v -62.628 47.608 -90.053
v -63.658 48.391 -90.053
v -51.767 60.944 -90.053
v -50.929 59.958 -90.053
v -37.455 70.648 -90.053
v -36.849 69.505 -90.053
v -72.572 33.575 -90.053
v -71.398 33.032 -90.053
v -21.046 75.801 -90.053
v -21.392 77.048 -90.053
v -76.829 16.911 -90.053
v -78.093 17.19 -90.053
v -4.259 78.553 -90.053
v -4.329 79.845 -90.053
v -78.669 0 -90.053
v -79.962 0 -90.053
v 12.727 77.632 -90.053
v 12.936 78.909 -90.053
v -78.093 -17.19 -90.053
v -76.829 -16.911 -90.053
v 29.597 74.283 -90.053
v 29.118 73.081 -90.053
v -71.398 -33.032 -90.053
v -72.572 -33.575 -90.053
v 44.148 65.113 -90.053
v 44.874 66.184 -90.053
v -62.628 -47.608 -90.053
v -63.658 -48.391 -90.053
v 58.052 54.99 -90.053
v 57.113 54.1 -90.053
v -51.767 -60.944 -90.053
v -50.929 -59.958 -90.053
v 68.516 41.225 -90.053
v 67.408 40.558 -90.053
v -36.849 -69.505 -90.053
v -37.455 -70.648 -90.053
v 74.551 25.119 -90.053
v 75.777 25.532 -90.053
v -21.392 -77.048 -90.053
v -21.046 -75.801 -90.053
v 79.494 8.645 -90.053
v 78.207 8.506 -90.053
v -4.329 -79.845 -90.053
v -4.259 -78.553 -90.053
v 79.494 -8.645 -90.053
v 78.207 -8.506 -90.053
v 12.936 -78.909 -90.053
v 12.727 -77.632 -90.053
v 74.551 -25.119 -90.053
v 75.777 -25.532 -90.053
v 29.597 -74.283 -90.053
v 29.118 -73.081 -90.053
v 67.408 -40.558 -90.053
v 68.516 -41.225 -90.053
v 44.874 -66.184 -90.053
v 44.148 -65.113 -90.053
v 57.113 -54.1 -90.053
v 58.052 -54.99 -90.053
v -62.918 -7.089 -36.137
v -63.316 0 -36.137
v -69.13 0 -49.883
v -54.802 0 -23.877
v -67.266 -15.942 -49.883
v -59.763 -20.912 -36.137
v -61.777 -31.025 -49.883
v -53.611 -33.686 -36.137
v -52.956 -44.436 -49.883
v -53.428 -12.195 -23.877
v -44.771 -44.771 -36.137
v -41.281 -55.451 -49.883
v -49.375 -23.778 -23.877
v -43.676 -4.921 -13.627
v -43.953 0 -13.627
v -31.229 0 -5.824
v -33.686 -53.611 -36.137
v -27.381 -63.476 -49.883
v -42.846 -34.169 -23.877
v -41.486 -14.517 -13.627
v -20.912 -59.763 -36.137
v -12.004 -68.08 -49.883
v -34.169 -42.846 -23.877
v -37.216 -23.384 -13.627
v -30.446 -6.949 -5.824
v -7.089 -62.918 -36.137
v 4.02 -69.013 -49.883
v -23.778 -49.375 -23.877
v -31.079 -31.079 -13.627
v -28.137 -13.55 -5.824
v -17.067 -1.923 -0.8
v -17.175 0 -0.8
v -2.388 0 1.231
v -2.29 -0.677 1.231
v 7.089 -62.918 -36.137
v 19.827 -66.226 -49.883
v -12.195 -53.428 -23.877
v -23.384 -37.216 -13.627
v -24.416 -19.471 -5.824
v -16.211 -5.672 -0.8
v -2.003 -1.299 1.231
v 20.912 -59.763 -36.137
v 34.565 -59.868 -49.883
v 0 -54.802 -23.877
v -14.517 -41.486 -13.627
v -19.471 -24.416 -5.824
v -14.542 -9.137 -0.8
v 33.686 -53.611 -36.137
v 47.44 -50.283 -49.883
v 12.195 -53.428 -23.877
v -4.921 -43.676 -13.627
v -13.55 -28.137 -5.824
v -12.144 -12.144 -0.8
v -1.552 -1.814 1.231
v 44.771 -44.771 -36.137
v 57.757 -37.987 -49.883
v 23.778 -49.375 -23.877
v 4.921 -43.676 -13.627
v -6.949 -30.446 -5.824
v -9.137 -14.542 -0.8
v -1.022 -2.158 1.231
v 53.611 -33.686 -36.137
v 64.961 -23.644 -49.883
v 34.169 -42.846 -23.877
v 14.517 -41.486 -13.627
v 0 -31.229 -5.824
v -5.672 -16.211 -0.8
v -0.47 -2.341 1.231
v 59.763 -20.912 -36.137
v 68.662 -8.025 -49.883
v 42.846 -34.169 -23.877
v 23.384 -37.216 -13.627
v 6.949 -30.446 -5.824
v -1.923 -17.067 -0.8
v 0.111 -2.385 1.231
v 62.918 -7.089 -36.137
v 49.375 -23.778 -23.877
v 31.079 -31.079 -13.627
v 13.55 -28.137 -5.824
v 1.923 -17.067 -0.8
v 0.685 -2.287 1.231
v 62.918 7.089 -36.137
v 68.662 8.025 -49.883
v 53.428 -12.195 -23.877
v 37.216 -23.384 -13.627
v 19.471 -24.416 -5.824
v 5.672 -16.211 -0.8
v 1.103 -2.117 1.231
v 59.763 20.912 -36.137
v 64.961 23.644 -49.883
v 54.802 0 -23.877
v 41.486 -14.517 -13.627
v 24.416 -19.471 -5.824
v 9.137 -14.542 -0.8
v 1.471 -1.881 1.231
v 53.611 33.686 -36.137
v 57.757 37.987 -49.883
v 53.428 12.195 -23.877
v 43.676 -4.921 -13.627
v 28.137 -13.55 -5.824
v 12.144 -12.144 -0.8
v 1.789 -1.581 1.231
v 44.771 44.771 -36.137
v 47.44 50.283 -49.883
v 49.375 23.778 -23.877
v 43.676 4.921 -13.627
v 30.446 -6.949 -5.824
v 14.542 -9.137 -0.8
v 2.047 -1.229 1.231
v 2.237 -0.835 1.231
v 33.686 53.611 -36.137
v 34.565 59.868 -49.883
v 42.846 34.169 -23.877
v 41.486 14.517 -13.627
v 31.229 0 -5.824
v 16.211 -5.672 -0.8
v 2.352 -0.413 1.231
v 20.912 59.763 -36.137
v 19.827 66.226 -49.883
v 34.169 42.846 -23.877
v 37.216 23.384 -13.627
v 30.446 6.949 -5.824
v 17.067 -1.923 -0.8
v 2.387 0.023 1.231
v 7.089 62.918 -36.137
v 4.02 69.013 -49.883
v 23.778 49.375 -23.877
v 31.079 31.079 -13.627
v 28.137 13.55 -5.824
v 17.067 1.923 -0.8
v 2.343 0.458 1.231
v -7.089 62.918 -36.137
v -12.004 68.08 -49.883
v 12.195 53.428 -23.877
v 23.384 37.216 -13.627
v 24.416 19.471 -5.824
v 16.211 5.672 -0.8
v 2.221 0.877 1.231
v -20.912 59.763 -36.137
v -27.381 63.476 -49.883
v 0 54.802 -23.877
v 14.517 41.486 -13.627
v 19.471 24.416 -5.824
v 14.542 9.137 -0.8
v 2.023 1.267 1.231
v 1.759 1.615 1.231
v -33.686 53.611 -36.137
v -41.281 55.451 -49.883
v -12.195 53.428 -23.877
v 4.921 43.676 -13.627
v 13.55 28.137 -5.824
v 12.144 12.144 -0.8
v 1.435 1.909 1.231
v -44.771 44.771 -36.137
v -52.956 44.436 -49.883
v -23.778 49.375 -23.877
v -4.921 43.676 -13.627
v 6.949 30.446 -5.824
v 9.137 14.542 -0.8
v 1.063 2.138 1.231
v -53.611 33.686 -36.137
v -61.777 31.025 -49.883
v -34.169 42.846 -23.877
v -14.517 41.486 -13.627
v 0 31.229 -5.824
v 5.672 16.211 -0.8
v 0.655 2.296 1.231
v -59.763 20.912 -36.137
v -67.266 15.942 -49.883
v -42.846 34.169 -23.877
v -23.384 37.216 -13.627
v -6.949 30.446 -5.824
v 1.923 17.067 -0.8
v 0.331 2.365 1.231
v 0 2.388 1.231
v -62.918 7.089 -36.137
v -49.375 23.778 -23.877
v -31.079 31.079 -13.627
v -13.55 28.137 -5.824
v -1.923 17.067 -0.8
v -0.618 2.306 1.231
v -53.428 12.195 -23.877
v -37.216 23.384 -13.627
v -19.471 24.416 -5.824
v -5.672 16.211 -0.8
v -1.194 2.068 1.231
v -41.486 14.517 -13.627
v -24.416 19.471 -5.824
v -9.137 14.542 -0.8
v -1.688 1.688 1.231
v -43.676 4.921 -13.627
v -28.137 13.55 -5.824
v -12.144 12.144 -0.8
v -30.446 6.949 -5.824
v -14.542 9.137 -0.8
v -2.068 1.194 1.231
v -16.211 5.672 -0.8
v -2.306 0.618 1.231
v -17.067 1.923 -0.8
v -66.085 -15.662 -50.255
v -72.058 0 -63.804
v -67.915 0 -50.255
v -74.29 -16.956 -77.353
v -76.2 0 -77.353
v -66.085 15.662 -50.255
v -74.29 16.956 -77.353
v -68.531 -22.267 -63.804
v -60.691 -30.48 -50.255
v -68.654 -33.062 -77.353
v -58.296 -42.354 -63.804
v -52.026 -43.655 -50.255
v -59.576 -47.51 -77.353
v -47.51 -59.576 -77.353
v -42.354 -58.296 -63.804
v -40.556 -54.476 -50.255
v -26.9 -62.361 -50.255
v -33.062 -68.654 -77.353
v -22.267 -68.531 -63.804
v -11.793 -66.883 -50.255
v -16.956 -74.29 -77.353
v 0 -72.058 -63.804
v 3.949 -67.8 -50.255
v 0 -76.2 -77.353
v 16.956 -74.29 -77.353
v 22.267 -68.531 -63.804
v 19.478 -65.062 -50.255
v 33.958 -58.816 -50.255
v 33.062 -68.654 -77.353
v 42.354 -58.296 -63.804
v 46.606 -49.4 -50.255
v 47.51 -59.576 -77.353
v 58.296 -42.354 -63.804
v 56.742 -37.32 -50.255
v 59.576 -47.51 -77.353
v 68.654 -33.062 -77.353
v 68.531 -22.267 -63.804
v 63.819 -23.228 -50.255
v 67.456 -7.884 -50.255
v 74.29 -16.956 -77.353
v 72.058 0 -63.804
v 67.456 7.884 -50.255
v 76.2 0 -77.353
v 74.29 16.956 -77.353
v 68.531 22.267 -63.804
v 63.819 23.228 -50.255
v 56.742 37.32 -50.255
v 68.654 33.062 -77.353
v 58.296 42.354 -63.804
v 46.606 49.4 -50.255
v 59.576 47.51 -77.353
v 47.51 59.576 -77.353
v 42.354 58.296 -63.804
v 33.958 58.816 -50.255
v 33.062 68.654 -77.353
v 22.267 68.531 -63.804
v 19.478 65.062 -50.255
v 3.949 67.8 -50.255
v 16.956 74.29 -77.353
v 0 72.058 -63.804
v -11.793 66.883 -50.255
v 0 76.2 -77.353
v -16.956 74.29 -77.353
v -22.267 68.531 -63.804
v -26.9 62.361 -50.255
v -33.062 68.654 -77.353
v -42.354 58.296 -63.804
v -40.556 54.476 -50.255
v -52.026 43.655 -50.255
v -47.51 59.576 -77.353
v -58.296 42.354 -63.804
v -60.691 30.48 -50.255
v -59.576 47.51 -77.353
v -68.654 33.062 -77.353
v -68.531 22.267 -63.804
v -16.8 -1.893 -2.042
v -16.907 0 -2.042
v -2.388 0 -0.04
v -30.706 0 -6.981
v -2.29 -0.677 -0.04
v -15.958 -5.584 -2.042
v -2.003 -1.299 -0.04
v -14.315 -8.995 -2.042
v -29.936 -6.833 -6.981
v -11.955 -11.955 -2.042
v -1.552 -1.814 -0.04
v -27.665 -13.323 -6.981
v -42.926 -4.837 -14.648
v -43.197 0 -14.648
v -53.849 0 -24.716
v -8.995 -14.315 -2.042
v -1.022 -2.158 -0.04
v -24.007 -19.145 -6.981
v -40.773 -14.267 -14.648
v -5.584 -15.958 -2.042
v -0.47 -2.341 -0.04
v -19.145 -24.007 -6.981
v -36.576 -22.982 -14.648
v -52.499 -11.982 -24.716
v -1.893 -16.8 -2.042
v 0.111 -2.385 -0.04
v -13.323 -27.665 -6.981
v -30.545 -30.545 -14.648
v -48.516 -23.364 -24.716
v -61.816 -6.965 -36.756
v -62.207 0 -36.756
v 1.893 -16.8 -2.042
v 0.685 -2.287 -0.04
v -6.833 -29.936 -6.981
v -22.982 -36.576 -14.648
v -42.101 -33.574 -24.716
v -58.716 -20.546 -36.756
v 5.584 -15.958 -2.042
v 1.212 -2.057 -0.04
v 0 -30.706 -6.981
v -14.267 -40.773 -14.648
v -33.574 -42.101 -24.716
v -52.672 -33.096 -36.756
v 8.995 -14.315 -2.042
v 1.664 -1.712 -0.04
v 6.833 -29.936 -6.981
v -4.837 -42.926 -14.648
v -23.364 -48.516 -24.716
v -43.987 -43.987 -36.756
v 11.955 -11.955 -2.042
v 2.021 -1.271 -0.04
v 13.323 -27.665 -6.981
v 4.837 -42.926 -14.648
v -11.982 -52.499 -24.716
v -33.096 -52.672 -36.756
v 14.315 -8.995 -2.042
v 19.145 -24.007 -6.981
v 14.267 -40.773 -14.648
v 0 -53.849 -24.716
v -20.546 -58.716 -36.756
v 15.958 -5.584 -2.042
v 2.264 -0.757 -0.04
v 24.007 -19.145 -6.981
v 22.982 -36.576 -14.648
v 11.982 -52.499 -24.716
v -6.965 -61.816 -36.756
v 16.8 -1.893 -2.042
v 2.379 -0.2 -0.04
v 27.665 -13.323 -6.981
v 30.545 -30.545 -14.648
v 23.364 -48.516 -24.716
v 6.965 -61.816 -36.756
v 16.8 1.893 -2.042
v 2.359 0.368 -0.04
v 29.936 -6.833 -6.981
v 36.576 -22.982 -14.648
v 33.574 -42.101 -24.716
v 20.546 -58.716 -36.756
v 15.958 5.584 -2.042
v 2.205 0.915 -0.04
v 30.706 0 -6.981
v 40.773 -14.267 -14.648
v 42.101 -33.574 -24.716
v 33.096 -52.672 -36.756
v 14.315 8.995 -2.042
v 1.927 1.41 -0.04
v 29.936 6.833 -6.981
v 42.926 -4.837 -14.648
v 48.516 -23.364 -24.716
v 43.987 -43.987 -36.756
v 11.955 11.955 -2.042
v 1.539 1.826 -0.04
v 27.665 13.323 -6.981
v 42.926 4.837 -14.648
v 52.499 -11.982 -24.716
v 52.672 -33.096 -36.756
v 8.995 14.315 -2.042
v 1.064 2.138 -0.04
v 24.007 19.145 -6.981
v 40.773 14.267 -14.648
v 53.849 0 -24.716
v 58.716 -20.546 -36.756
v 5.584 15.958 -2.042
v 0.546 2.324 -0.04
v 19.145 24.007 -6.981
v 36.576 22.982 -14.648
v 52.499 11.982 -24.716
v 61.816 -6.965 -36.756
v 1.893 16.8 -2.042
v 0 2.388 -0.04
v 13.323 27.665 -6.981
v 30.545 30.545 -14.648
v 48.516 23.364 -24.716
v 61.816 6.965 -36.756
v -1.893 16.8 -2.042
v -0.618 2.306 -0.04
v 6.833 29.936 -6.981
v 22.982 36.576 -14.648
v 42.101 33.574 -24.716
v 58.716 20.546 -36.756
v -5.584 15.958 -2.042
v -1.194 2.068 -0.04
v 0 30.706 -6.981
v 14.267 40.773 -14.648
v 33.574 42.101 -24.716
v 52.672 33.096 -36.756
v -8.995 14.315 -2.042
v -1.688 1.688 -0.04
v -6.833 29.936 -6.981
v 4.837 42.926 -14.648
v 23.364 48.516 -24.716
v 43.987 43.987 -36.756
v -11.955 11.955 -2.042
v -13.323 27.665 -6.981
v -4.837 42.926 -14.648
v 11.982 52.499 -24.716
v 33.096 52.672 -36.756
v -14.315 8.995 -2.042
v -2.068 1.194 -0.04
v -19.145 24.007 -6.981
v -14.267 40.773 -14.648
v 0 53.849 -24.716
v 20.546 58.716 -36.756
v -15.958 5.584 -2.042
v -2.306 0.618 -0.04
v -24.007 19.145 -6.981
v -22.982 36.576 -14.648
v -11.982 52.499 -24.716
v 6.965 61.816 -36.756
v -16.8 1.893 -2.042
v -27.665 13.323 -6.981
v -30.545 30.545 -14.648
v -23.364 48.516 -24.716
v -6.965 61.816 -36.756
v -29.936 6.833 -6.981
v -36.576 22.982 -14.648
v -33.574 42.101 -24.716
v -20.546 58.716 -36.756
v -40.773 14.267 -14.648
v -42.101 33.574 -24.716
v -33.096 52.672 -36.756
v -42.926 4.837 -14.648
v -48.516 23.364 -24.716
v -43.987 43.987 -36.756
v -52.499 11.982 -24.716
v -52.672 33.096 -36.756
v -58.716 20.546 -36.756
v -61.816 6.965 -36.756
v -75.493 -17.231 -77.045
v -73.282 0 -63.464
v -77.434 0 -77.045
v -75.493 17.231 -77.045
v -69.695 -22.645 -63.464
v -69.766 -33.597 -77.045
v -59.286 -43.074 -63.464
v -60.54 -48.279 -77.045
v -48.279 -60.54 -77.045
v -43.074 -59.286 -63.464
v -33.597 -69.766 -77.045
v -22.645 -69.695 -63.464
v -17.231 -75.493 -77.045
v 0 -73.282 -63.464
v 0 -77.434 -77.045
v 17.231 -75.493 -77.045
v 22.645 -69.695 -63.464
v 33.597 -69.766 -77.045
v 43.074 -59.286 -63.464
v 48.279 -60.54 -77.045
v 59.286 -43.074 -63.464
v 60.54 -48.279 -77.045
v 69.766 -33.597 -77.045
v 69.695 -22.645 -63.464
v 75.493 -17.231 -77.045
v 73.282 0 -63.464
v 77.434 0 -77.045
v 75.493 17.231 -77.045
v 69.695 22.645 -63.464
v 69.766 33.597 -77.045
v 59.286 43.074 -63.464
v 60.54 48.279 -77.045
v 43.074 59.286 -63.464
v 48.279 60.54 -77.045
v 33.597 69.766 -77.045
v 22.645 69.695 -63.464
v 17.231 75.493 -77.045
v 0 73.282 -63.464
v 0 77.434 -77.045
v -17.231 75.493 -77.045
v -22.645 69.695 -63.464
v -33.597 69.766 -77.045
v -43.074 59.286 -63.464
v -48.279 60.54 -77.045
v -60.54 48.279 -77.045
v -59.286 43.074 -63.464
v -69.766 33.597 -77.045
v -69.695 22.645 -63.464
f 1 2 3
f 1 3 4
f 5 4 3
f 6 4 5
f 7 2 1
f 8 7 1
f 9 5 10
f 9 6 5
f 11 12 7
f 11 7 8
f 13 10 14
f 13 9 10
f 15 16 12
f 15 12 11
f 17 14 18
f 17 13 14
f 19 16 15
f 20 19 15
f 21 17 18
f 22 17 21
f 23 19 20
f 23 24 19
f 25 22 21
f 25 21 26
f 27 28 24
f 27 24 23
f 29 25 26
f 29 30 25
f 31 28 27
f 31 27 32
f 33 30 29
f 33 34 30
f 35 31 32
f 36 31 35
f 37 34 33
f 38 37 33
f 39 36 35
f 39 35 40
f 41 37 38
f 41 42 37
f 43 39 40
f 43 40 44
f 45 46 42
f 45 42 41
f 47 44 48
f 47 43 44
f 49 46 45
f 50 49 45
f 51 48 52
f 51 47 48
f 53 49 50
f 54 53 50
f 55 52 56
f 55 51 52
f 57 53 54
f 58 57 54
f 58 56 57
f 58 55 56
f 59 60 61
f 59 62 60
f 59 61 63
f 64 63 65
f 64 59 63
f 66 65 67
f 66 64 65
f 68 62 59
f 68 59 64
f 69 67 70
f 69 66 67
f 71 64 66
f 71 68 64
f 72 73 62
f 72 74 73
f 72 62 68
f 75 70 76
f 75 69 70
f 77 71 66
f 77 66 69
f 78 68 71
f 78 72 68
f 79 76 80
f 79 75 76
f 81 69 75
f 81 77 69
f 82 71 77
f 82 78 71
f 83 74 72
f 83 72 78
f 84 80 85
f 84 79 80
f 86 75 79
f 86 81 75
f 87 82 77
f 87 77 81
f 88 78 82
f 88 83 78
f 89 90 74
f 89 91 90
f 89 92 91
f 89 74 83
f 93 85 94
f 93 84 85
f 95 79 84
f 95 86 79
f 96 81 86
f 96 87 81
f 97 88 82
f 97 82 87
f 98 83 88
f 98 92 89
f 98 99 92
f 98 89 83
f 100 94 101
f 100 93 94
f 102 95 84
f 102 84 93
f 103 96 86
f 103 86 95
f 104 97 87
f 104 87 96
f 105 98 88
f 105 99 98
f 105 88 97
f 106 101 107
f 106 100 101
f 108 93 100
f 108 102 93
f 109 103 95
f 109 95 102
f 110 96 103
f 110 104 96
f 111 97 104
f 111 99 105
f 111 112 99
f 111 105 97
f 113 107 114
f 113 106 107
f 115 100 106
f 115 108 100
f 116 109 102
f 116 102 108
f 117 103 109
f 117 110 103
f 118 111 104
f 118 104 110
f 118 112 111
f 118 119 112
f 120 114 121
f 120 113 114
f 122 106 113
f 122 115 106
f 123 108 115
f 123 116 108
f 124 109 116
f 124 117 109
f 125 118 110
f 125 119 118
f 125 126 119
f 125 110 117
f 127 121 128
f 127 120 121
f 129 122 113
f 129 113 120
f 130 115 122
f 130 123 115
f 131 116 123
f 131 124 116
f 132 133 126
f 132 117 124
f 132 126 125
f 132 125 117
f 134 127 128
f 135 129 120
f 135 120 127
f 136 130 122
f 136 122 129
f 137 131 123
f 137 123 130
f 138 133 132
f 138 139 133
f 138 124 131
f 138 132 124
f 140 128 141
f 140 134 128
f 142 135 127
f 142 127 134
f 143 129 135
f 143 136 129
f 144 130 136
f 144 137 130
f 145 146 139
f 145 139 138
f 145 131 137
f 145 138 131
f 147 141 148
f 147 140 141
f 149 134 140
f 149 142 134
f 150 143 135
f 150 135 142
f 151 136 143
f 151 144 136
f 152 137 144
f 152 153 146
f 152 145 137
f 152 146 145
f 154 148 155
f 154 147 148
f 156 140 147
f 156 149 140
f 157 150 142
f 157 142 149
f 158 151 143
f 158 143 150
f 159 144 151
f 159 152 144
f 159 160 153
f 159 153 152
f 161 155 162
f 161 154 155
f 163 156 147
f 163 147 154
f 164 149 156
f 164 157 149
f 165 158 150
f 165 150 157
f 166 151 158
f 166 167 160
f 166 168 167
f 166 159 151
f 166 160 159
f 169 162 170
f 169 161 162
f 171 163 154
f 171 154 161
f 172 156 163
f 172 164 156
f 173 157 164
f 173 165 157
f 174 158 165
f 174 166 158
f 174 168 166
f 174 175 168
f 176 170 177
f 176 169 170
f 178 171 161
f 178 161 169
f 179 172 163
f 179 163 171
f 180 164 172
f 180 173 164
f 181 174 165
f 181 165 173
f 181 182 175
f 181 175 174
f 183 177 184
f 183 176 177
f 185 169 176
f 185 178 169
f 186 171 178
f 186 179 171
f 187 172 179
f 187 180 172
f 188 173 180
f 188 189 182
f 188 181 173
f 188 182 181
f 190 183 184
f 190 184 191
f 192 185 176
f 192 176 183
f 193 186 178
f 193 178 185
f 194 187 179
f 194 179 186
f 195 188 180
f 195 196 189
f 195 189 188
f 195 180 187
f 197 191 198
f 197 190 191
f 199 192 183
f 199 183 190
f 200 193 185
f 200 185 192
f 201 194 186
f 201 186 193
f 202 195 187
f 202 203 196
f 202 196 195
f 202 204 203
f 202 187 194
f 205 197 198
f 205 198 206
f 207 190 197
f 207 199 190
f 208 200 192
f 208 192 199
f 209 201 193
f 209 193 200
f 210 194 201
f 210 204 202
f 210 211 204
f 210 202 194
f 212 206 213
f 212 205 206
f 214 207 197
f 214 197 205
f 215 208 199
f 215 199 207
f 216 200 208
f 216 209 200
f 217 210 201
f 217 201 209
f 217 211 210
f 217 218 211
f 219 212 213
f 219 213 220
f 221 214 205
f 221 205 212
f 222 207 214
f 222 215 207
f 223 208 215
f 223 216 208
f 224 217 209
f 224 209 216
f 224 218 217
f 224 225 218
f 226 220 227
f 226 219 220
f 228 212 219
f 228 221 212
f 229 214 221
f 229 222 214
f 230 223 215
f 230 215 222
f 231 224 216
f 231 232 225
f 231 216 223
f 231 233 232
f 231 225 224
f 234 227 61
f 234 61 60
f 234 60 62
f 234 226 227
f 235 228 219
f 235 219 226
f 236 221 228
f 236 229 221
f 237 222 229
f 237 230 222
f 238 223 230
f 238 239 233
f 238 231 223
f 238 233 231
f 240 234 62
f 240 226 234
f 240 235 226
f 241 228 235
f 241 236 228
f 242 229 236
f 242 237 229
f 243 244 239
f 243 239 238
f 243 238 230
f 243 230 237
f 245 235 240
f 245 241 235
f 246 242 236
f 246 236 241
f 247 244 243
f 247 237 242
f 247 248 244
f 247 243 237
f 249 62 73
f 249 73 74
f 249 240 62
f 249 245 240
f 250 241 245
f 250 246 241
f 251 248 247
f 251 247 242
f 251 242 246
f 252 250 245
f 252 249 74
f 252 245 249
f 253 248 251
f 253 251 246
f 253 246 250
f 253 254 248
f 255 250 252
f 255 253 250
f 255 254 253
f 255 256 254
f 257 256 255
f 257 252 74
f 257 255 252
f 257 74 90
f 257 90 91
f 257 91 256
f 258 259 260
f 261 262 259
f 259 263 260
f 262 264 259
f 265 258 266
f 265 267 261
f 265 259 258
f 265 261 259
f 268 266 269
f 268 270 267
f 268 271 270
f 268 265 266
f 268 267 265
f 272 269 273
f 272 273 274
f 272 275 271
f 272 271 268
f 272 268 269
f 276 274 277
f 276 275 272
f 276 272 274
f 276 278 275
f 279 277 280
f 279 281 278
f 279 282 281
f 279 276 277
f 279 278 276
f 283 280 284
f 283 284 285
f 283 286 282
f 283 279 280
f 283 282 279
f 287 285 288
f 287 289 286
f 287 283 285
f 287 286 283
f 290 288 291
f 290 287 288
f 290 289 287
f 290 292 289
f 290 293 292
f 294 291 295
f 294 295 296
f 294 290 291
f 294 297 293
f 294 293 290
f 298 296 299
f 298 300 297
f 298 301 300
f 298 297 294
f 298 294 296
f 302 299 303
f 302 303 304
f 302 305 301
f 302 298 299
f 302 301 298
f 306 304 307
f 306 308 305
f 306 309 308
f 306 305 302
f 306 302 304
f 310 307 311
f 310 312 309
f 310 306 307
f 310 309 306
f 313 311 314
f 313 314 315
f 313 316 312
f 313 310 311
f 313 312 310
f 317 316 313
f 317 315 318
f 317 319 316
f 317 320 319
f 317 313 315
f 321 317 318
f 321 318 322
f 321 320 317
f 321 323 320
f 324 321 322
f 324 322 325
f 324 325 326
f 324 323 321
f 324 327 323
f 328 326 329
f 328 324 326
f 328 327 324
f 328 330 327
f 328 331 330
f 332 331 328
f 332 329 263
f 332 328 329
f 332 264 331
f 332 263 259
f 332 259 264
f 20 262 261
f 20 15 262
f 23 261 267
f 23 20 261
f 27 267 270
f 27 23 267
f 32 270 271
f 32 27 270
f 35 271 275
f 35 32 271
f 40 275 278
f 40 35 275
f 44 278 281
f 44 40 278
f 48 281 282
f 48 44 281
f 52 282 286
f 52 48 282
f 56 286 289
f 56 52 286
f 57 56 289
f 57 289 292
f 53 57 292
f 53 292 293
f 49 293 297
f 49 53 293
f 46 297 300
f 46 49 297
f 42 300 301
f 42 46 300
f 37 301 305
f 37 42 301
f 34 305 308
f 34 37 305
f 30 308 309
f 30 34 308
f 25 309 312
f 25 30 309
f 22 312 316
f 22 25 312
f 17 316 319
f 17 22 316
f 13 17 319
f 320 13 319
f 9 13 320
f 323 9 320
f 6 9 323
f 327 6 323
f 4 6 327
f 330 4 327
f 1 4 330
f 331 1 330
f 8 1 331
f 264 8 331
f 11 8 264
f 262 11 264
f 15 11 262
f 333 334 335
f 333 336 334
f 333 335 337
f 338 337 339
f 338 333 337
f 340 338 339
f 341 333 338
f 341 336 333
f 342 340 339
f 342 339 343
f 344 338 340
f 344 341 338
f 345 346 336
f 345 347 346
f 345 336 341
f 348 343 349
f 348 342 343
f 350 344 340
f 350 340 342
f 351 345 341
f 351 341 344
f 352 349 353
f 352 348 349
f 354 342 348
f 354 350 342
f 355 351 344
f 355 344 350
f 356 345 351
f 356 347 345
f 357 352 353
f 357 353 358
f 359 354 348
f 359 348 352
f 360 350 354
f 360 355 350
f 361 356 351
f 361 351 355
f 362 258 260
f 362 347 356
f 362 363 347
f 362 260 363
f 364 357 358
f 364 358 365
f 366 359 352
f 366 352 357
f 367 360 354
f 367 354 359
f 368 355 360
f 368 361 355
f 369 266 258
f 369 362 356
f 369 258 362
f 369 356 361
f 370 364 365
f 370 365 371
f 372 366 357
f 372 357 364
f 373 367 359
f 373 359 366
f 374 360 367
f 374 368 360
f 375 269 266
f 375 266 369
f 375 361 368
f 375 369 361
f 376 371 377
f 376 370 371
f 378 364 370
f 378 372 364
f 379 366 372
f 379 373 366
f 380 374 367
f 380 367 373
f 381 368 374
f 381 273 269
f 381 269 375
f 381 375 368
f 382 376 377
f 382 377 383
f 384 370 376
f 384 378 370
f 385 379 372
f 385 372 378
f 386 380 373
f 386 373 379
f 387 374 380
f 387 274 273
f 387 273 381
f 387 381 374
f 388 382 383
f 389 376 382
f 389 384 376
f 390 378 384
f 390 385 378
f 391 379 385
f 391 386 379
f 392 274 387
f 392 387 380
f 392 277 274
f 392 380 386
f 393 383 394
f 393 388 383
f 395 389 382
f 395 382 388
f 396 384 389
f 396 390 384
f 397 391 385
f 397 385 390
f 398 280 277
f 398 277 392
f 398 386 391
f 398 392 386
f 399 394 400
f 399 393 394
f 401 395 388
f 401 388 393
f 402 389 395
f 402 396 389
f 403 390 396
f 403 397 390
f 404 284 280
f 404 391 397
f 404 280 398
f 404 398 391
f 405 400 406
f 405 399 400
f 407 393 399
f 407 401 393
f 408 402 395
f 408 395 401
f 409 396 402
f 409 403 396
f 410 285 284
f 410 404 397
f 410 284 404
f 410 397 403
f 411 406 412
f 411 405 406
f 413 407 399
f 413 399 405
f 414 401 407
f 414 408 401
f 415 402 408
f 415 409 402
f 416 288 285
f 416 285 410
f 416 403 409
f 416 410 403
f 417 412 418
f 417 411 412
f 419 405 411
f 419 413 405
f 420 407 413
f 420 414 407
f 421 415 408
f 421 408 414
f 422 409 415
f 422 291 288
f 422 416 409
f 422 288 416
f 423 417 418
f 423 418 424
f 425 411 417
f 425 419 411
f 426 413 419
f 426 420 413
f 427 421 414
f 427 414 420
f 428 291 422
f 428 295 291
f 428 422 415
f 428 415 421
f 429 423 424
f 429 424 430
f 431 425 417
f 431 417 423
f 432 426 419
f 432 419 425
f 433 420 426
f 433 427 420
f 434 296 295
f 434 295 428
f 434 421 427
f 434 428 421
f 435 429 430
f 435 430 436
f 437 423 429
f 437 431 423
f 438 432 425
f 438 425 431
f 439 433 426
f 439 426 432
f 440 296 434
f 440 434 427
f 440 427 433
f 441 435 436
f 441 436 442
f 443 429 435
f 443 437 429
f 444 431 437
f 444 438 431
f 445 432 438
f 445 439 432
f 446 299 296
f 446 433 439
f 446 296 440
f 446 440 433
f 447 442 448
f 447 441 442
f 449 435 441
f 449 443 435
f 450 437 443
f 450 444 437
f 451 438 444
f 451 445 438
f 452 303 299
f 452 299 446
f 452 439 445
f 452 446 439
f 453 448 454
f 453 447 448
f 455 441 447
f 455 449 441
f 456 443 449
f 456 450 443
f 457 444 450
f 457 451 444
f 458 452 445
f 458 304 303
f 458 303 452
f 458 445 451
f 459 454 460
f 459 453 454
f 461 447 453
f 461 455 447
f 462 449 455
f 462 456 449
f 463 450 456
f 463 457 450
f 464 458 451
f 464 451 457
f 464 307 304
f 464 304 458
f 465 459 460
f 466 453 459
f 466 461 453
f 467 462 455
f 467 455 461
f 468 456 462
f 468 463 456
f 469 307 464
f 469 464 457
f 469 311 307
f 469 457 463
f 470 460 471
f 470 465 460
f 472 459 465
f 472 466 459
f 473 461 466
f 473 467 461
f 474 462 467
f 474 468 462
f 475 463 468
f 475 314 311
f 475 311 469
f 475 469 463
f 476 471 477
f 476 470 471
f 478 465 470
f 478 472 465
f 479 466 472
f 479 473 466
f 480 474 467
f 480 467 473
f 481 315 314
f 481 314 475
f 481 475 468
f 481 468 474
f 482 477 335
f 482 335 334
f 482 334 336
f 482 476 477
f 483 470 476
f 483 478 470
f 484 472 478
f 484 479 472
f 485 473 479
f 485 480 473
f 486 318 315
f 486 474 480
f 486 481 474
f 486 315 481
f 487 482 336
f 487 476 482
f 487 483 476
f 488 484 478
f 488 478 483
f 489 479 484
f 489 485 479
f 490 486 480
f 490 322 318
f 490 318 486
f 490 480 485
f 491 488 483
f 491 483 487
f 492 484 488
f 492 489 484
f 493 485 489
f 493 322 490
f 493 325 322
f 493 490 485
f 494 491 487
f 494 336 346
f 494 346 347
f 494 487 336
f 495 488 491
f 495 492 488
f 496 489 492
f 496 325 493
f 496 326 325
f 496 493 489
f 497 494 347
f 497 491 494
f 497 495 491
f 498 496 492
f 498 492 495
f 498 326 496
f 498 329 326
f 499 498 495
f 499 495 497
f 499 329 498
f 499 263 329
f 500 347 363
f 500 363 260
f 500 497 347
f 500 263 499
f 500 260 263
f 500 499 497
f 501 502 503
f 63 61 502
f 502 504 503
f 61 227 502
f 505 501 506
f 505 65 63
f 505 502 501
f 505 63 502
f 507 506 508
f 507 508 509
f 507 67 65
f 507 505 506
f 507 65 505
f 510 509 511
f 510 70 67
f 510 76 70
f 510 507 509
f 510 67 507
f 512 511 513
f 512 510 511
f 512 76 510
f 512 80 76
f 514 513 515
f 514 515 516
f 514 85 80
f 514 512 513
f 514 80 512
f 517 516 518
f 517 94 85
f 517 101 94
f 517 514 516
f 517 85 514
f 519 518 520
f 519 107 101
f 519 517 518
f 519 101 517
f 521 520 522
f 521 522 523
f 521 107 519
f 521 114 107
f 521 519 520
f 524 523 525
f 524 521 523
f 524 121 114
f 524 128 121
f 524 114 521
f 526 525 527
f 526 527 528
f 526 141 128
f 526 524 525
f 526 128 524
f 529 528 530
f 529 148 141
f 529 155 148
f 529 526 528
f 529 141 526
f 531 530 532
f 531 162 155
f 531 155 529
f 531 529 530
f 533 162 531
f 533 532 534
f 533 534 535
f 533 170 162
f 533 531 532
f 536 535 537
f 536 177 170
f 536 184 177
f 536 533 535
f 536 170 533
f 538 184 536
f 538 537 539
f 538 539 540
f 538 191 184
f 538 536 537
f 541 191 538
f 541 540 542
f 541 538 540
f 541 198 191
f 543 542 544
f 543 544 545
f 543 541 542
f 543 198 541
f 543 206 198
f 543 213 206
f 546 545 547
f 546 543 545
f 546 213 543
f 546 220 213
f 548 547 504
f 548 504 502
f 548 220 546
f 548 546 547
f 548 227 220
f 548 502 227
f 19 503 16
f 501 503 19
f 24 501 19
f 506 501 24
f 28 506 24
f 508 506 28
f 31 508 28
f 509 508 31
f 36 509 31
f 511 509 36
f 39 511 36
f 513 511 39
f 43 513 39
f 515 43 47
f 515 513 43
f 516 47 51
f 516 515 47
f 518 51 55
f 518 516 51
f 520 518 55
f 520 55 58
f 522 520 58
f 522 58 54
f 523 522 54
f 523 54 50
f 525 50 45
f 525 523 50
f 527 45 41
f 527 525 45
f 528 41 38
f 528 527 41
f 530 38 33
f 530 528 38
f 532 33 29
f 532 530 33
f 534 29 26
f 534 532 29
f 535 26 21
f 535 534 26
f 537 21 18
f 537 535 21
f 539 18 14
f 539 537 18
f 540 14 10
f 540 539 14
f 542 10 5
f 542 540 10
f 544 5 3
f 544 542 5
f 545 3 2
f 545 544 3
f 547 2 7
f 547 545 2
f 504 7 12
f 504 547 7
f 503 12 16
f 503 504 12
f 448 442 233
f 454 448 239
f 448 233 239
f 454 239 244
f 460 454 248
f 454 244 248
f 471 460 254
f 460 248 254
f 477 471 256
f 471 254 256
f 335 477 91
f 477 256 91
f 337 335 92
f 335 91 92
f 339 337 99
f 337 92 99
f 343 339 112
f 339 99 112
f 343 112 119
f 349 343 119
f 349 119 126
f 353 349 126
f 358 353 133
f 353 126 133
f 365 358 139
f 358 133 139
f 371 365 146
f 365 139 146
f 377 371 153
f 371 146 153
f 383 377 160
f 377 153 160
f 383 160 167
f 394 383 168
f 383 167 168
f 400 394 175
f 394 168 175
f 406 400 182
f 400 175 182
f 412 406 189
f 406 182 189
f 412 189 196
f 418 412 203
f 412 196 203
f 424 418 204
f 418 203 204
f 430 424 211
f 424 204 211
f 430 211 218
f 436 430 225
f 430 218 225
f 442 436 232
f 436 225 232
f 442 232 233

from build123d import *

# Parameters (mm, degrees)
SKETCH7_R          = 2.3876
CUT_EXTRUDE3_DEPTH = 12.7


with BuildPart() as part:
    # Sketch1 → Revolve-Thin1 (revolve)
    with BuildSketch(Plane(origin=(0, 0, 0), x_dir=(0, 0, -1), z_dir=(1, 0, 0)), mode=Mode.PRIVATE) as revolve_thin1_sk:
        with BuildLine():
            ThreePointArc((0, 0), (13.92977193, 42.243362599), (50.254629325, 67.915233681))
            Line((50.254629325, 67.915233681), (77.352878934, 76.2))
            Line((77.352878934, 76.2), (90.052878934, 78.668629926))
            Line((90.052878934, 78.668629926), (103.700637121, 81.321485381))
            ThreePointArc((103.700637121, 81.321485381), (107.388816105, 83.515721298), (108.839, 87.554817996))
            Line((108.839, 87.554817996), (108.839, 114.3))
            Line((108.839, 114.3), (106.299, 114.3))
            Line((106.299, 114.3), (106.299, 87.554817996))
            ThreePointArc((106.299, 87.554817996), (105.428889663, 85.131359977), (103.215982272, 83.814818427))
            Line((103.215982272, 83.814818427), (89.568224085, 81.161962972))
            Line((89.568224085, 81.161962972), (76.737554038, 78.667933362))
            Line((76.737554038, 78.667933362), (49.512005195, 70.344247761))
            ThreePointArc((49.512005195, 70.344247761), (11.887975504, 43.754212477), (-2.54, 0))
            Line((-2.54, 0), (0, 0))
        make_face()
    revolve(revolve_thin1_sk.sketch.rotate(Axis((0, 0, -134.341700673), (0, 0, 1)), 90), axis=Axis((0, 0, -134.341700673), (0, 0, 1)))

    # Sketch5 → Cut-Revolve1 (revolve, cut)
    with BuildSketch(Plane(origin=(0, 0, 0), x_dir=(0, 0, -1), z_dir=(1, 0, 0)), mode=Mode.PRIVATE) as cut_revolve1_sk:
        with BuildLine():
            Line((-1.27, 0), (-23.88640598, 0))
            Line((-23.88640598, 0), (-23.88640598, 127.217845703))
            Line((-23.88640598, 127.217845703), (116.900257224, 127.217845703))
            Line((116.900257224, 127.217845703), (116.900257224, 70.000934593))
            Line((116.900257224, 70.000934593), (90.052878934, 70.000934593))
            Line((90.052878934, 70.000934593), (90.052878934, 79.962400129))
            Line((90.052878934, 79.962400129), (77.045216486, 77.433966681))
            Line((77.045216486, 77.433966681), (49.88331726, 69.129740721))
            ThreePointArc((49.88331726, 69.129740721), (12.908873717, 42.998787538), (-1.27, 0))
        make_face()
    revolve(cut_revolve1_sk.sketch.rotate(Axis((0, 0, -134.341700673), (0, 0, 1)), 90), axis=Axis((0, 0, -134.341700673), (0, 0, 1)), mode=Mode.SUBTRACT)

    # Sketch7 → Cut-Extrude3 (cut, symmetric)
    with BuildSketch(Plane.XY):
        with Locations(Location((0, 0, 0), (0, 0, 90))):
            Circle(SKETCH7_R)
    extrude(amount=CUT_EXTRUDE3_DEPTH, both=True, mode=Mode.SUBTRACT)


solid = part.part
